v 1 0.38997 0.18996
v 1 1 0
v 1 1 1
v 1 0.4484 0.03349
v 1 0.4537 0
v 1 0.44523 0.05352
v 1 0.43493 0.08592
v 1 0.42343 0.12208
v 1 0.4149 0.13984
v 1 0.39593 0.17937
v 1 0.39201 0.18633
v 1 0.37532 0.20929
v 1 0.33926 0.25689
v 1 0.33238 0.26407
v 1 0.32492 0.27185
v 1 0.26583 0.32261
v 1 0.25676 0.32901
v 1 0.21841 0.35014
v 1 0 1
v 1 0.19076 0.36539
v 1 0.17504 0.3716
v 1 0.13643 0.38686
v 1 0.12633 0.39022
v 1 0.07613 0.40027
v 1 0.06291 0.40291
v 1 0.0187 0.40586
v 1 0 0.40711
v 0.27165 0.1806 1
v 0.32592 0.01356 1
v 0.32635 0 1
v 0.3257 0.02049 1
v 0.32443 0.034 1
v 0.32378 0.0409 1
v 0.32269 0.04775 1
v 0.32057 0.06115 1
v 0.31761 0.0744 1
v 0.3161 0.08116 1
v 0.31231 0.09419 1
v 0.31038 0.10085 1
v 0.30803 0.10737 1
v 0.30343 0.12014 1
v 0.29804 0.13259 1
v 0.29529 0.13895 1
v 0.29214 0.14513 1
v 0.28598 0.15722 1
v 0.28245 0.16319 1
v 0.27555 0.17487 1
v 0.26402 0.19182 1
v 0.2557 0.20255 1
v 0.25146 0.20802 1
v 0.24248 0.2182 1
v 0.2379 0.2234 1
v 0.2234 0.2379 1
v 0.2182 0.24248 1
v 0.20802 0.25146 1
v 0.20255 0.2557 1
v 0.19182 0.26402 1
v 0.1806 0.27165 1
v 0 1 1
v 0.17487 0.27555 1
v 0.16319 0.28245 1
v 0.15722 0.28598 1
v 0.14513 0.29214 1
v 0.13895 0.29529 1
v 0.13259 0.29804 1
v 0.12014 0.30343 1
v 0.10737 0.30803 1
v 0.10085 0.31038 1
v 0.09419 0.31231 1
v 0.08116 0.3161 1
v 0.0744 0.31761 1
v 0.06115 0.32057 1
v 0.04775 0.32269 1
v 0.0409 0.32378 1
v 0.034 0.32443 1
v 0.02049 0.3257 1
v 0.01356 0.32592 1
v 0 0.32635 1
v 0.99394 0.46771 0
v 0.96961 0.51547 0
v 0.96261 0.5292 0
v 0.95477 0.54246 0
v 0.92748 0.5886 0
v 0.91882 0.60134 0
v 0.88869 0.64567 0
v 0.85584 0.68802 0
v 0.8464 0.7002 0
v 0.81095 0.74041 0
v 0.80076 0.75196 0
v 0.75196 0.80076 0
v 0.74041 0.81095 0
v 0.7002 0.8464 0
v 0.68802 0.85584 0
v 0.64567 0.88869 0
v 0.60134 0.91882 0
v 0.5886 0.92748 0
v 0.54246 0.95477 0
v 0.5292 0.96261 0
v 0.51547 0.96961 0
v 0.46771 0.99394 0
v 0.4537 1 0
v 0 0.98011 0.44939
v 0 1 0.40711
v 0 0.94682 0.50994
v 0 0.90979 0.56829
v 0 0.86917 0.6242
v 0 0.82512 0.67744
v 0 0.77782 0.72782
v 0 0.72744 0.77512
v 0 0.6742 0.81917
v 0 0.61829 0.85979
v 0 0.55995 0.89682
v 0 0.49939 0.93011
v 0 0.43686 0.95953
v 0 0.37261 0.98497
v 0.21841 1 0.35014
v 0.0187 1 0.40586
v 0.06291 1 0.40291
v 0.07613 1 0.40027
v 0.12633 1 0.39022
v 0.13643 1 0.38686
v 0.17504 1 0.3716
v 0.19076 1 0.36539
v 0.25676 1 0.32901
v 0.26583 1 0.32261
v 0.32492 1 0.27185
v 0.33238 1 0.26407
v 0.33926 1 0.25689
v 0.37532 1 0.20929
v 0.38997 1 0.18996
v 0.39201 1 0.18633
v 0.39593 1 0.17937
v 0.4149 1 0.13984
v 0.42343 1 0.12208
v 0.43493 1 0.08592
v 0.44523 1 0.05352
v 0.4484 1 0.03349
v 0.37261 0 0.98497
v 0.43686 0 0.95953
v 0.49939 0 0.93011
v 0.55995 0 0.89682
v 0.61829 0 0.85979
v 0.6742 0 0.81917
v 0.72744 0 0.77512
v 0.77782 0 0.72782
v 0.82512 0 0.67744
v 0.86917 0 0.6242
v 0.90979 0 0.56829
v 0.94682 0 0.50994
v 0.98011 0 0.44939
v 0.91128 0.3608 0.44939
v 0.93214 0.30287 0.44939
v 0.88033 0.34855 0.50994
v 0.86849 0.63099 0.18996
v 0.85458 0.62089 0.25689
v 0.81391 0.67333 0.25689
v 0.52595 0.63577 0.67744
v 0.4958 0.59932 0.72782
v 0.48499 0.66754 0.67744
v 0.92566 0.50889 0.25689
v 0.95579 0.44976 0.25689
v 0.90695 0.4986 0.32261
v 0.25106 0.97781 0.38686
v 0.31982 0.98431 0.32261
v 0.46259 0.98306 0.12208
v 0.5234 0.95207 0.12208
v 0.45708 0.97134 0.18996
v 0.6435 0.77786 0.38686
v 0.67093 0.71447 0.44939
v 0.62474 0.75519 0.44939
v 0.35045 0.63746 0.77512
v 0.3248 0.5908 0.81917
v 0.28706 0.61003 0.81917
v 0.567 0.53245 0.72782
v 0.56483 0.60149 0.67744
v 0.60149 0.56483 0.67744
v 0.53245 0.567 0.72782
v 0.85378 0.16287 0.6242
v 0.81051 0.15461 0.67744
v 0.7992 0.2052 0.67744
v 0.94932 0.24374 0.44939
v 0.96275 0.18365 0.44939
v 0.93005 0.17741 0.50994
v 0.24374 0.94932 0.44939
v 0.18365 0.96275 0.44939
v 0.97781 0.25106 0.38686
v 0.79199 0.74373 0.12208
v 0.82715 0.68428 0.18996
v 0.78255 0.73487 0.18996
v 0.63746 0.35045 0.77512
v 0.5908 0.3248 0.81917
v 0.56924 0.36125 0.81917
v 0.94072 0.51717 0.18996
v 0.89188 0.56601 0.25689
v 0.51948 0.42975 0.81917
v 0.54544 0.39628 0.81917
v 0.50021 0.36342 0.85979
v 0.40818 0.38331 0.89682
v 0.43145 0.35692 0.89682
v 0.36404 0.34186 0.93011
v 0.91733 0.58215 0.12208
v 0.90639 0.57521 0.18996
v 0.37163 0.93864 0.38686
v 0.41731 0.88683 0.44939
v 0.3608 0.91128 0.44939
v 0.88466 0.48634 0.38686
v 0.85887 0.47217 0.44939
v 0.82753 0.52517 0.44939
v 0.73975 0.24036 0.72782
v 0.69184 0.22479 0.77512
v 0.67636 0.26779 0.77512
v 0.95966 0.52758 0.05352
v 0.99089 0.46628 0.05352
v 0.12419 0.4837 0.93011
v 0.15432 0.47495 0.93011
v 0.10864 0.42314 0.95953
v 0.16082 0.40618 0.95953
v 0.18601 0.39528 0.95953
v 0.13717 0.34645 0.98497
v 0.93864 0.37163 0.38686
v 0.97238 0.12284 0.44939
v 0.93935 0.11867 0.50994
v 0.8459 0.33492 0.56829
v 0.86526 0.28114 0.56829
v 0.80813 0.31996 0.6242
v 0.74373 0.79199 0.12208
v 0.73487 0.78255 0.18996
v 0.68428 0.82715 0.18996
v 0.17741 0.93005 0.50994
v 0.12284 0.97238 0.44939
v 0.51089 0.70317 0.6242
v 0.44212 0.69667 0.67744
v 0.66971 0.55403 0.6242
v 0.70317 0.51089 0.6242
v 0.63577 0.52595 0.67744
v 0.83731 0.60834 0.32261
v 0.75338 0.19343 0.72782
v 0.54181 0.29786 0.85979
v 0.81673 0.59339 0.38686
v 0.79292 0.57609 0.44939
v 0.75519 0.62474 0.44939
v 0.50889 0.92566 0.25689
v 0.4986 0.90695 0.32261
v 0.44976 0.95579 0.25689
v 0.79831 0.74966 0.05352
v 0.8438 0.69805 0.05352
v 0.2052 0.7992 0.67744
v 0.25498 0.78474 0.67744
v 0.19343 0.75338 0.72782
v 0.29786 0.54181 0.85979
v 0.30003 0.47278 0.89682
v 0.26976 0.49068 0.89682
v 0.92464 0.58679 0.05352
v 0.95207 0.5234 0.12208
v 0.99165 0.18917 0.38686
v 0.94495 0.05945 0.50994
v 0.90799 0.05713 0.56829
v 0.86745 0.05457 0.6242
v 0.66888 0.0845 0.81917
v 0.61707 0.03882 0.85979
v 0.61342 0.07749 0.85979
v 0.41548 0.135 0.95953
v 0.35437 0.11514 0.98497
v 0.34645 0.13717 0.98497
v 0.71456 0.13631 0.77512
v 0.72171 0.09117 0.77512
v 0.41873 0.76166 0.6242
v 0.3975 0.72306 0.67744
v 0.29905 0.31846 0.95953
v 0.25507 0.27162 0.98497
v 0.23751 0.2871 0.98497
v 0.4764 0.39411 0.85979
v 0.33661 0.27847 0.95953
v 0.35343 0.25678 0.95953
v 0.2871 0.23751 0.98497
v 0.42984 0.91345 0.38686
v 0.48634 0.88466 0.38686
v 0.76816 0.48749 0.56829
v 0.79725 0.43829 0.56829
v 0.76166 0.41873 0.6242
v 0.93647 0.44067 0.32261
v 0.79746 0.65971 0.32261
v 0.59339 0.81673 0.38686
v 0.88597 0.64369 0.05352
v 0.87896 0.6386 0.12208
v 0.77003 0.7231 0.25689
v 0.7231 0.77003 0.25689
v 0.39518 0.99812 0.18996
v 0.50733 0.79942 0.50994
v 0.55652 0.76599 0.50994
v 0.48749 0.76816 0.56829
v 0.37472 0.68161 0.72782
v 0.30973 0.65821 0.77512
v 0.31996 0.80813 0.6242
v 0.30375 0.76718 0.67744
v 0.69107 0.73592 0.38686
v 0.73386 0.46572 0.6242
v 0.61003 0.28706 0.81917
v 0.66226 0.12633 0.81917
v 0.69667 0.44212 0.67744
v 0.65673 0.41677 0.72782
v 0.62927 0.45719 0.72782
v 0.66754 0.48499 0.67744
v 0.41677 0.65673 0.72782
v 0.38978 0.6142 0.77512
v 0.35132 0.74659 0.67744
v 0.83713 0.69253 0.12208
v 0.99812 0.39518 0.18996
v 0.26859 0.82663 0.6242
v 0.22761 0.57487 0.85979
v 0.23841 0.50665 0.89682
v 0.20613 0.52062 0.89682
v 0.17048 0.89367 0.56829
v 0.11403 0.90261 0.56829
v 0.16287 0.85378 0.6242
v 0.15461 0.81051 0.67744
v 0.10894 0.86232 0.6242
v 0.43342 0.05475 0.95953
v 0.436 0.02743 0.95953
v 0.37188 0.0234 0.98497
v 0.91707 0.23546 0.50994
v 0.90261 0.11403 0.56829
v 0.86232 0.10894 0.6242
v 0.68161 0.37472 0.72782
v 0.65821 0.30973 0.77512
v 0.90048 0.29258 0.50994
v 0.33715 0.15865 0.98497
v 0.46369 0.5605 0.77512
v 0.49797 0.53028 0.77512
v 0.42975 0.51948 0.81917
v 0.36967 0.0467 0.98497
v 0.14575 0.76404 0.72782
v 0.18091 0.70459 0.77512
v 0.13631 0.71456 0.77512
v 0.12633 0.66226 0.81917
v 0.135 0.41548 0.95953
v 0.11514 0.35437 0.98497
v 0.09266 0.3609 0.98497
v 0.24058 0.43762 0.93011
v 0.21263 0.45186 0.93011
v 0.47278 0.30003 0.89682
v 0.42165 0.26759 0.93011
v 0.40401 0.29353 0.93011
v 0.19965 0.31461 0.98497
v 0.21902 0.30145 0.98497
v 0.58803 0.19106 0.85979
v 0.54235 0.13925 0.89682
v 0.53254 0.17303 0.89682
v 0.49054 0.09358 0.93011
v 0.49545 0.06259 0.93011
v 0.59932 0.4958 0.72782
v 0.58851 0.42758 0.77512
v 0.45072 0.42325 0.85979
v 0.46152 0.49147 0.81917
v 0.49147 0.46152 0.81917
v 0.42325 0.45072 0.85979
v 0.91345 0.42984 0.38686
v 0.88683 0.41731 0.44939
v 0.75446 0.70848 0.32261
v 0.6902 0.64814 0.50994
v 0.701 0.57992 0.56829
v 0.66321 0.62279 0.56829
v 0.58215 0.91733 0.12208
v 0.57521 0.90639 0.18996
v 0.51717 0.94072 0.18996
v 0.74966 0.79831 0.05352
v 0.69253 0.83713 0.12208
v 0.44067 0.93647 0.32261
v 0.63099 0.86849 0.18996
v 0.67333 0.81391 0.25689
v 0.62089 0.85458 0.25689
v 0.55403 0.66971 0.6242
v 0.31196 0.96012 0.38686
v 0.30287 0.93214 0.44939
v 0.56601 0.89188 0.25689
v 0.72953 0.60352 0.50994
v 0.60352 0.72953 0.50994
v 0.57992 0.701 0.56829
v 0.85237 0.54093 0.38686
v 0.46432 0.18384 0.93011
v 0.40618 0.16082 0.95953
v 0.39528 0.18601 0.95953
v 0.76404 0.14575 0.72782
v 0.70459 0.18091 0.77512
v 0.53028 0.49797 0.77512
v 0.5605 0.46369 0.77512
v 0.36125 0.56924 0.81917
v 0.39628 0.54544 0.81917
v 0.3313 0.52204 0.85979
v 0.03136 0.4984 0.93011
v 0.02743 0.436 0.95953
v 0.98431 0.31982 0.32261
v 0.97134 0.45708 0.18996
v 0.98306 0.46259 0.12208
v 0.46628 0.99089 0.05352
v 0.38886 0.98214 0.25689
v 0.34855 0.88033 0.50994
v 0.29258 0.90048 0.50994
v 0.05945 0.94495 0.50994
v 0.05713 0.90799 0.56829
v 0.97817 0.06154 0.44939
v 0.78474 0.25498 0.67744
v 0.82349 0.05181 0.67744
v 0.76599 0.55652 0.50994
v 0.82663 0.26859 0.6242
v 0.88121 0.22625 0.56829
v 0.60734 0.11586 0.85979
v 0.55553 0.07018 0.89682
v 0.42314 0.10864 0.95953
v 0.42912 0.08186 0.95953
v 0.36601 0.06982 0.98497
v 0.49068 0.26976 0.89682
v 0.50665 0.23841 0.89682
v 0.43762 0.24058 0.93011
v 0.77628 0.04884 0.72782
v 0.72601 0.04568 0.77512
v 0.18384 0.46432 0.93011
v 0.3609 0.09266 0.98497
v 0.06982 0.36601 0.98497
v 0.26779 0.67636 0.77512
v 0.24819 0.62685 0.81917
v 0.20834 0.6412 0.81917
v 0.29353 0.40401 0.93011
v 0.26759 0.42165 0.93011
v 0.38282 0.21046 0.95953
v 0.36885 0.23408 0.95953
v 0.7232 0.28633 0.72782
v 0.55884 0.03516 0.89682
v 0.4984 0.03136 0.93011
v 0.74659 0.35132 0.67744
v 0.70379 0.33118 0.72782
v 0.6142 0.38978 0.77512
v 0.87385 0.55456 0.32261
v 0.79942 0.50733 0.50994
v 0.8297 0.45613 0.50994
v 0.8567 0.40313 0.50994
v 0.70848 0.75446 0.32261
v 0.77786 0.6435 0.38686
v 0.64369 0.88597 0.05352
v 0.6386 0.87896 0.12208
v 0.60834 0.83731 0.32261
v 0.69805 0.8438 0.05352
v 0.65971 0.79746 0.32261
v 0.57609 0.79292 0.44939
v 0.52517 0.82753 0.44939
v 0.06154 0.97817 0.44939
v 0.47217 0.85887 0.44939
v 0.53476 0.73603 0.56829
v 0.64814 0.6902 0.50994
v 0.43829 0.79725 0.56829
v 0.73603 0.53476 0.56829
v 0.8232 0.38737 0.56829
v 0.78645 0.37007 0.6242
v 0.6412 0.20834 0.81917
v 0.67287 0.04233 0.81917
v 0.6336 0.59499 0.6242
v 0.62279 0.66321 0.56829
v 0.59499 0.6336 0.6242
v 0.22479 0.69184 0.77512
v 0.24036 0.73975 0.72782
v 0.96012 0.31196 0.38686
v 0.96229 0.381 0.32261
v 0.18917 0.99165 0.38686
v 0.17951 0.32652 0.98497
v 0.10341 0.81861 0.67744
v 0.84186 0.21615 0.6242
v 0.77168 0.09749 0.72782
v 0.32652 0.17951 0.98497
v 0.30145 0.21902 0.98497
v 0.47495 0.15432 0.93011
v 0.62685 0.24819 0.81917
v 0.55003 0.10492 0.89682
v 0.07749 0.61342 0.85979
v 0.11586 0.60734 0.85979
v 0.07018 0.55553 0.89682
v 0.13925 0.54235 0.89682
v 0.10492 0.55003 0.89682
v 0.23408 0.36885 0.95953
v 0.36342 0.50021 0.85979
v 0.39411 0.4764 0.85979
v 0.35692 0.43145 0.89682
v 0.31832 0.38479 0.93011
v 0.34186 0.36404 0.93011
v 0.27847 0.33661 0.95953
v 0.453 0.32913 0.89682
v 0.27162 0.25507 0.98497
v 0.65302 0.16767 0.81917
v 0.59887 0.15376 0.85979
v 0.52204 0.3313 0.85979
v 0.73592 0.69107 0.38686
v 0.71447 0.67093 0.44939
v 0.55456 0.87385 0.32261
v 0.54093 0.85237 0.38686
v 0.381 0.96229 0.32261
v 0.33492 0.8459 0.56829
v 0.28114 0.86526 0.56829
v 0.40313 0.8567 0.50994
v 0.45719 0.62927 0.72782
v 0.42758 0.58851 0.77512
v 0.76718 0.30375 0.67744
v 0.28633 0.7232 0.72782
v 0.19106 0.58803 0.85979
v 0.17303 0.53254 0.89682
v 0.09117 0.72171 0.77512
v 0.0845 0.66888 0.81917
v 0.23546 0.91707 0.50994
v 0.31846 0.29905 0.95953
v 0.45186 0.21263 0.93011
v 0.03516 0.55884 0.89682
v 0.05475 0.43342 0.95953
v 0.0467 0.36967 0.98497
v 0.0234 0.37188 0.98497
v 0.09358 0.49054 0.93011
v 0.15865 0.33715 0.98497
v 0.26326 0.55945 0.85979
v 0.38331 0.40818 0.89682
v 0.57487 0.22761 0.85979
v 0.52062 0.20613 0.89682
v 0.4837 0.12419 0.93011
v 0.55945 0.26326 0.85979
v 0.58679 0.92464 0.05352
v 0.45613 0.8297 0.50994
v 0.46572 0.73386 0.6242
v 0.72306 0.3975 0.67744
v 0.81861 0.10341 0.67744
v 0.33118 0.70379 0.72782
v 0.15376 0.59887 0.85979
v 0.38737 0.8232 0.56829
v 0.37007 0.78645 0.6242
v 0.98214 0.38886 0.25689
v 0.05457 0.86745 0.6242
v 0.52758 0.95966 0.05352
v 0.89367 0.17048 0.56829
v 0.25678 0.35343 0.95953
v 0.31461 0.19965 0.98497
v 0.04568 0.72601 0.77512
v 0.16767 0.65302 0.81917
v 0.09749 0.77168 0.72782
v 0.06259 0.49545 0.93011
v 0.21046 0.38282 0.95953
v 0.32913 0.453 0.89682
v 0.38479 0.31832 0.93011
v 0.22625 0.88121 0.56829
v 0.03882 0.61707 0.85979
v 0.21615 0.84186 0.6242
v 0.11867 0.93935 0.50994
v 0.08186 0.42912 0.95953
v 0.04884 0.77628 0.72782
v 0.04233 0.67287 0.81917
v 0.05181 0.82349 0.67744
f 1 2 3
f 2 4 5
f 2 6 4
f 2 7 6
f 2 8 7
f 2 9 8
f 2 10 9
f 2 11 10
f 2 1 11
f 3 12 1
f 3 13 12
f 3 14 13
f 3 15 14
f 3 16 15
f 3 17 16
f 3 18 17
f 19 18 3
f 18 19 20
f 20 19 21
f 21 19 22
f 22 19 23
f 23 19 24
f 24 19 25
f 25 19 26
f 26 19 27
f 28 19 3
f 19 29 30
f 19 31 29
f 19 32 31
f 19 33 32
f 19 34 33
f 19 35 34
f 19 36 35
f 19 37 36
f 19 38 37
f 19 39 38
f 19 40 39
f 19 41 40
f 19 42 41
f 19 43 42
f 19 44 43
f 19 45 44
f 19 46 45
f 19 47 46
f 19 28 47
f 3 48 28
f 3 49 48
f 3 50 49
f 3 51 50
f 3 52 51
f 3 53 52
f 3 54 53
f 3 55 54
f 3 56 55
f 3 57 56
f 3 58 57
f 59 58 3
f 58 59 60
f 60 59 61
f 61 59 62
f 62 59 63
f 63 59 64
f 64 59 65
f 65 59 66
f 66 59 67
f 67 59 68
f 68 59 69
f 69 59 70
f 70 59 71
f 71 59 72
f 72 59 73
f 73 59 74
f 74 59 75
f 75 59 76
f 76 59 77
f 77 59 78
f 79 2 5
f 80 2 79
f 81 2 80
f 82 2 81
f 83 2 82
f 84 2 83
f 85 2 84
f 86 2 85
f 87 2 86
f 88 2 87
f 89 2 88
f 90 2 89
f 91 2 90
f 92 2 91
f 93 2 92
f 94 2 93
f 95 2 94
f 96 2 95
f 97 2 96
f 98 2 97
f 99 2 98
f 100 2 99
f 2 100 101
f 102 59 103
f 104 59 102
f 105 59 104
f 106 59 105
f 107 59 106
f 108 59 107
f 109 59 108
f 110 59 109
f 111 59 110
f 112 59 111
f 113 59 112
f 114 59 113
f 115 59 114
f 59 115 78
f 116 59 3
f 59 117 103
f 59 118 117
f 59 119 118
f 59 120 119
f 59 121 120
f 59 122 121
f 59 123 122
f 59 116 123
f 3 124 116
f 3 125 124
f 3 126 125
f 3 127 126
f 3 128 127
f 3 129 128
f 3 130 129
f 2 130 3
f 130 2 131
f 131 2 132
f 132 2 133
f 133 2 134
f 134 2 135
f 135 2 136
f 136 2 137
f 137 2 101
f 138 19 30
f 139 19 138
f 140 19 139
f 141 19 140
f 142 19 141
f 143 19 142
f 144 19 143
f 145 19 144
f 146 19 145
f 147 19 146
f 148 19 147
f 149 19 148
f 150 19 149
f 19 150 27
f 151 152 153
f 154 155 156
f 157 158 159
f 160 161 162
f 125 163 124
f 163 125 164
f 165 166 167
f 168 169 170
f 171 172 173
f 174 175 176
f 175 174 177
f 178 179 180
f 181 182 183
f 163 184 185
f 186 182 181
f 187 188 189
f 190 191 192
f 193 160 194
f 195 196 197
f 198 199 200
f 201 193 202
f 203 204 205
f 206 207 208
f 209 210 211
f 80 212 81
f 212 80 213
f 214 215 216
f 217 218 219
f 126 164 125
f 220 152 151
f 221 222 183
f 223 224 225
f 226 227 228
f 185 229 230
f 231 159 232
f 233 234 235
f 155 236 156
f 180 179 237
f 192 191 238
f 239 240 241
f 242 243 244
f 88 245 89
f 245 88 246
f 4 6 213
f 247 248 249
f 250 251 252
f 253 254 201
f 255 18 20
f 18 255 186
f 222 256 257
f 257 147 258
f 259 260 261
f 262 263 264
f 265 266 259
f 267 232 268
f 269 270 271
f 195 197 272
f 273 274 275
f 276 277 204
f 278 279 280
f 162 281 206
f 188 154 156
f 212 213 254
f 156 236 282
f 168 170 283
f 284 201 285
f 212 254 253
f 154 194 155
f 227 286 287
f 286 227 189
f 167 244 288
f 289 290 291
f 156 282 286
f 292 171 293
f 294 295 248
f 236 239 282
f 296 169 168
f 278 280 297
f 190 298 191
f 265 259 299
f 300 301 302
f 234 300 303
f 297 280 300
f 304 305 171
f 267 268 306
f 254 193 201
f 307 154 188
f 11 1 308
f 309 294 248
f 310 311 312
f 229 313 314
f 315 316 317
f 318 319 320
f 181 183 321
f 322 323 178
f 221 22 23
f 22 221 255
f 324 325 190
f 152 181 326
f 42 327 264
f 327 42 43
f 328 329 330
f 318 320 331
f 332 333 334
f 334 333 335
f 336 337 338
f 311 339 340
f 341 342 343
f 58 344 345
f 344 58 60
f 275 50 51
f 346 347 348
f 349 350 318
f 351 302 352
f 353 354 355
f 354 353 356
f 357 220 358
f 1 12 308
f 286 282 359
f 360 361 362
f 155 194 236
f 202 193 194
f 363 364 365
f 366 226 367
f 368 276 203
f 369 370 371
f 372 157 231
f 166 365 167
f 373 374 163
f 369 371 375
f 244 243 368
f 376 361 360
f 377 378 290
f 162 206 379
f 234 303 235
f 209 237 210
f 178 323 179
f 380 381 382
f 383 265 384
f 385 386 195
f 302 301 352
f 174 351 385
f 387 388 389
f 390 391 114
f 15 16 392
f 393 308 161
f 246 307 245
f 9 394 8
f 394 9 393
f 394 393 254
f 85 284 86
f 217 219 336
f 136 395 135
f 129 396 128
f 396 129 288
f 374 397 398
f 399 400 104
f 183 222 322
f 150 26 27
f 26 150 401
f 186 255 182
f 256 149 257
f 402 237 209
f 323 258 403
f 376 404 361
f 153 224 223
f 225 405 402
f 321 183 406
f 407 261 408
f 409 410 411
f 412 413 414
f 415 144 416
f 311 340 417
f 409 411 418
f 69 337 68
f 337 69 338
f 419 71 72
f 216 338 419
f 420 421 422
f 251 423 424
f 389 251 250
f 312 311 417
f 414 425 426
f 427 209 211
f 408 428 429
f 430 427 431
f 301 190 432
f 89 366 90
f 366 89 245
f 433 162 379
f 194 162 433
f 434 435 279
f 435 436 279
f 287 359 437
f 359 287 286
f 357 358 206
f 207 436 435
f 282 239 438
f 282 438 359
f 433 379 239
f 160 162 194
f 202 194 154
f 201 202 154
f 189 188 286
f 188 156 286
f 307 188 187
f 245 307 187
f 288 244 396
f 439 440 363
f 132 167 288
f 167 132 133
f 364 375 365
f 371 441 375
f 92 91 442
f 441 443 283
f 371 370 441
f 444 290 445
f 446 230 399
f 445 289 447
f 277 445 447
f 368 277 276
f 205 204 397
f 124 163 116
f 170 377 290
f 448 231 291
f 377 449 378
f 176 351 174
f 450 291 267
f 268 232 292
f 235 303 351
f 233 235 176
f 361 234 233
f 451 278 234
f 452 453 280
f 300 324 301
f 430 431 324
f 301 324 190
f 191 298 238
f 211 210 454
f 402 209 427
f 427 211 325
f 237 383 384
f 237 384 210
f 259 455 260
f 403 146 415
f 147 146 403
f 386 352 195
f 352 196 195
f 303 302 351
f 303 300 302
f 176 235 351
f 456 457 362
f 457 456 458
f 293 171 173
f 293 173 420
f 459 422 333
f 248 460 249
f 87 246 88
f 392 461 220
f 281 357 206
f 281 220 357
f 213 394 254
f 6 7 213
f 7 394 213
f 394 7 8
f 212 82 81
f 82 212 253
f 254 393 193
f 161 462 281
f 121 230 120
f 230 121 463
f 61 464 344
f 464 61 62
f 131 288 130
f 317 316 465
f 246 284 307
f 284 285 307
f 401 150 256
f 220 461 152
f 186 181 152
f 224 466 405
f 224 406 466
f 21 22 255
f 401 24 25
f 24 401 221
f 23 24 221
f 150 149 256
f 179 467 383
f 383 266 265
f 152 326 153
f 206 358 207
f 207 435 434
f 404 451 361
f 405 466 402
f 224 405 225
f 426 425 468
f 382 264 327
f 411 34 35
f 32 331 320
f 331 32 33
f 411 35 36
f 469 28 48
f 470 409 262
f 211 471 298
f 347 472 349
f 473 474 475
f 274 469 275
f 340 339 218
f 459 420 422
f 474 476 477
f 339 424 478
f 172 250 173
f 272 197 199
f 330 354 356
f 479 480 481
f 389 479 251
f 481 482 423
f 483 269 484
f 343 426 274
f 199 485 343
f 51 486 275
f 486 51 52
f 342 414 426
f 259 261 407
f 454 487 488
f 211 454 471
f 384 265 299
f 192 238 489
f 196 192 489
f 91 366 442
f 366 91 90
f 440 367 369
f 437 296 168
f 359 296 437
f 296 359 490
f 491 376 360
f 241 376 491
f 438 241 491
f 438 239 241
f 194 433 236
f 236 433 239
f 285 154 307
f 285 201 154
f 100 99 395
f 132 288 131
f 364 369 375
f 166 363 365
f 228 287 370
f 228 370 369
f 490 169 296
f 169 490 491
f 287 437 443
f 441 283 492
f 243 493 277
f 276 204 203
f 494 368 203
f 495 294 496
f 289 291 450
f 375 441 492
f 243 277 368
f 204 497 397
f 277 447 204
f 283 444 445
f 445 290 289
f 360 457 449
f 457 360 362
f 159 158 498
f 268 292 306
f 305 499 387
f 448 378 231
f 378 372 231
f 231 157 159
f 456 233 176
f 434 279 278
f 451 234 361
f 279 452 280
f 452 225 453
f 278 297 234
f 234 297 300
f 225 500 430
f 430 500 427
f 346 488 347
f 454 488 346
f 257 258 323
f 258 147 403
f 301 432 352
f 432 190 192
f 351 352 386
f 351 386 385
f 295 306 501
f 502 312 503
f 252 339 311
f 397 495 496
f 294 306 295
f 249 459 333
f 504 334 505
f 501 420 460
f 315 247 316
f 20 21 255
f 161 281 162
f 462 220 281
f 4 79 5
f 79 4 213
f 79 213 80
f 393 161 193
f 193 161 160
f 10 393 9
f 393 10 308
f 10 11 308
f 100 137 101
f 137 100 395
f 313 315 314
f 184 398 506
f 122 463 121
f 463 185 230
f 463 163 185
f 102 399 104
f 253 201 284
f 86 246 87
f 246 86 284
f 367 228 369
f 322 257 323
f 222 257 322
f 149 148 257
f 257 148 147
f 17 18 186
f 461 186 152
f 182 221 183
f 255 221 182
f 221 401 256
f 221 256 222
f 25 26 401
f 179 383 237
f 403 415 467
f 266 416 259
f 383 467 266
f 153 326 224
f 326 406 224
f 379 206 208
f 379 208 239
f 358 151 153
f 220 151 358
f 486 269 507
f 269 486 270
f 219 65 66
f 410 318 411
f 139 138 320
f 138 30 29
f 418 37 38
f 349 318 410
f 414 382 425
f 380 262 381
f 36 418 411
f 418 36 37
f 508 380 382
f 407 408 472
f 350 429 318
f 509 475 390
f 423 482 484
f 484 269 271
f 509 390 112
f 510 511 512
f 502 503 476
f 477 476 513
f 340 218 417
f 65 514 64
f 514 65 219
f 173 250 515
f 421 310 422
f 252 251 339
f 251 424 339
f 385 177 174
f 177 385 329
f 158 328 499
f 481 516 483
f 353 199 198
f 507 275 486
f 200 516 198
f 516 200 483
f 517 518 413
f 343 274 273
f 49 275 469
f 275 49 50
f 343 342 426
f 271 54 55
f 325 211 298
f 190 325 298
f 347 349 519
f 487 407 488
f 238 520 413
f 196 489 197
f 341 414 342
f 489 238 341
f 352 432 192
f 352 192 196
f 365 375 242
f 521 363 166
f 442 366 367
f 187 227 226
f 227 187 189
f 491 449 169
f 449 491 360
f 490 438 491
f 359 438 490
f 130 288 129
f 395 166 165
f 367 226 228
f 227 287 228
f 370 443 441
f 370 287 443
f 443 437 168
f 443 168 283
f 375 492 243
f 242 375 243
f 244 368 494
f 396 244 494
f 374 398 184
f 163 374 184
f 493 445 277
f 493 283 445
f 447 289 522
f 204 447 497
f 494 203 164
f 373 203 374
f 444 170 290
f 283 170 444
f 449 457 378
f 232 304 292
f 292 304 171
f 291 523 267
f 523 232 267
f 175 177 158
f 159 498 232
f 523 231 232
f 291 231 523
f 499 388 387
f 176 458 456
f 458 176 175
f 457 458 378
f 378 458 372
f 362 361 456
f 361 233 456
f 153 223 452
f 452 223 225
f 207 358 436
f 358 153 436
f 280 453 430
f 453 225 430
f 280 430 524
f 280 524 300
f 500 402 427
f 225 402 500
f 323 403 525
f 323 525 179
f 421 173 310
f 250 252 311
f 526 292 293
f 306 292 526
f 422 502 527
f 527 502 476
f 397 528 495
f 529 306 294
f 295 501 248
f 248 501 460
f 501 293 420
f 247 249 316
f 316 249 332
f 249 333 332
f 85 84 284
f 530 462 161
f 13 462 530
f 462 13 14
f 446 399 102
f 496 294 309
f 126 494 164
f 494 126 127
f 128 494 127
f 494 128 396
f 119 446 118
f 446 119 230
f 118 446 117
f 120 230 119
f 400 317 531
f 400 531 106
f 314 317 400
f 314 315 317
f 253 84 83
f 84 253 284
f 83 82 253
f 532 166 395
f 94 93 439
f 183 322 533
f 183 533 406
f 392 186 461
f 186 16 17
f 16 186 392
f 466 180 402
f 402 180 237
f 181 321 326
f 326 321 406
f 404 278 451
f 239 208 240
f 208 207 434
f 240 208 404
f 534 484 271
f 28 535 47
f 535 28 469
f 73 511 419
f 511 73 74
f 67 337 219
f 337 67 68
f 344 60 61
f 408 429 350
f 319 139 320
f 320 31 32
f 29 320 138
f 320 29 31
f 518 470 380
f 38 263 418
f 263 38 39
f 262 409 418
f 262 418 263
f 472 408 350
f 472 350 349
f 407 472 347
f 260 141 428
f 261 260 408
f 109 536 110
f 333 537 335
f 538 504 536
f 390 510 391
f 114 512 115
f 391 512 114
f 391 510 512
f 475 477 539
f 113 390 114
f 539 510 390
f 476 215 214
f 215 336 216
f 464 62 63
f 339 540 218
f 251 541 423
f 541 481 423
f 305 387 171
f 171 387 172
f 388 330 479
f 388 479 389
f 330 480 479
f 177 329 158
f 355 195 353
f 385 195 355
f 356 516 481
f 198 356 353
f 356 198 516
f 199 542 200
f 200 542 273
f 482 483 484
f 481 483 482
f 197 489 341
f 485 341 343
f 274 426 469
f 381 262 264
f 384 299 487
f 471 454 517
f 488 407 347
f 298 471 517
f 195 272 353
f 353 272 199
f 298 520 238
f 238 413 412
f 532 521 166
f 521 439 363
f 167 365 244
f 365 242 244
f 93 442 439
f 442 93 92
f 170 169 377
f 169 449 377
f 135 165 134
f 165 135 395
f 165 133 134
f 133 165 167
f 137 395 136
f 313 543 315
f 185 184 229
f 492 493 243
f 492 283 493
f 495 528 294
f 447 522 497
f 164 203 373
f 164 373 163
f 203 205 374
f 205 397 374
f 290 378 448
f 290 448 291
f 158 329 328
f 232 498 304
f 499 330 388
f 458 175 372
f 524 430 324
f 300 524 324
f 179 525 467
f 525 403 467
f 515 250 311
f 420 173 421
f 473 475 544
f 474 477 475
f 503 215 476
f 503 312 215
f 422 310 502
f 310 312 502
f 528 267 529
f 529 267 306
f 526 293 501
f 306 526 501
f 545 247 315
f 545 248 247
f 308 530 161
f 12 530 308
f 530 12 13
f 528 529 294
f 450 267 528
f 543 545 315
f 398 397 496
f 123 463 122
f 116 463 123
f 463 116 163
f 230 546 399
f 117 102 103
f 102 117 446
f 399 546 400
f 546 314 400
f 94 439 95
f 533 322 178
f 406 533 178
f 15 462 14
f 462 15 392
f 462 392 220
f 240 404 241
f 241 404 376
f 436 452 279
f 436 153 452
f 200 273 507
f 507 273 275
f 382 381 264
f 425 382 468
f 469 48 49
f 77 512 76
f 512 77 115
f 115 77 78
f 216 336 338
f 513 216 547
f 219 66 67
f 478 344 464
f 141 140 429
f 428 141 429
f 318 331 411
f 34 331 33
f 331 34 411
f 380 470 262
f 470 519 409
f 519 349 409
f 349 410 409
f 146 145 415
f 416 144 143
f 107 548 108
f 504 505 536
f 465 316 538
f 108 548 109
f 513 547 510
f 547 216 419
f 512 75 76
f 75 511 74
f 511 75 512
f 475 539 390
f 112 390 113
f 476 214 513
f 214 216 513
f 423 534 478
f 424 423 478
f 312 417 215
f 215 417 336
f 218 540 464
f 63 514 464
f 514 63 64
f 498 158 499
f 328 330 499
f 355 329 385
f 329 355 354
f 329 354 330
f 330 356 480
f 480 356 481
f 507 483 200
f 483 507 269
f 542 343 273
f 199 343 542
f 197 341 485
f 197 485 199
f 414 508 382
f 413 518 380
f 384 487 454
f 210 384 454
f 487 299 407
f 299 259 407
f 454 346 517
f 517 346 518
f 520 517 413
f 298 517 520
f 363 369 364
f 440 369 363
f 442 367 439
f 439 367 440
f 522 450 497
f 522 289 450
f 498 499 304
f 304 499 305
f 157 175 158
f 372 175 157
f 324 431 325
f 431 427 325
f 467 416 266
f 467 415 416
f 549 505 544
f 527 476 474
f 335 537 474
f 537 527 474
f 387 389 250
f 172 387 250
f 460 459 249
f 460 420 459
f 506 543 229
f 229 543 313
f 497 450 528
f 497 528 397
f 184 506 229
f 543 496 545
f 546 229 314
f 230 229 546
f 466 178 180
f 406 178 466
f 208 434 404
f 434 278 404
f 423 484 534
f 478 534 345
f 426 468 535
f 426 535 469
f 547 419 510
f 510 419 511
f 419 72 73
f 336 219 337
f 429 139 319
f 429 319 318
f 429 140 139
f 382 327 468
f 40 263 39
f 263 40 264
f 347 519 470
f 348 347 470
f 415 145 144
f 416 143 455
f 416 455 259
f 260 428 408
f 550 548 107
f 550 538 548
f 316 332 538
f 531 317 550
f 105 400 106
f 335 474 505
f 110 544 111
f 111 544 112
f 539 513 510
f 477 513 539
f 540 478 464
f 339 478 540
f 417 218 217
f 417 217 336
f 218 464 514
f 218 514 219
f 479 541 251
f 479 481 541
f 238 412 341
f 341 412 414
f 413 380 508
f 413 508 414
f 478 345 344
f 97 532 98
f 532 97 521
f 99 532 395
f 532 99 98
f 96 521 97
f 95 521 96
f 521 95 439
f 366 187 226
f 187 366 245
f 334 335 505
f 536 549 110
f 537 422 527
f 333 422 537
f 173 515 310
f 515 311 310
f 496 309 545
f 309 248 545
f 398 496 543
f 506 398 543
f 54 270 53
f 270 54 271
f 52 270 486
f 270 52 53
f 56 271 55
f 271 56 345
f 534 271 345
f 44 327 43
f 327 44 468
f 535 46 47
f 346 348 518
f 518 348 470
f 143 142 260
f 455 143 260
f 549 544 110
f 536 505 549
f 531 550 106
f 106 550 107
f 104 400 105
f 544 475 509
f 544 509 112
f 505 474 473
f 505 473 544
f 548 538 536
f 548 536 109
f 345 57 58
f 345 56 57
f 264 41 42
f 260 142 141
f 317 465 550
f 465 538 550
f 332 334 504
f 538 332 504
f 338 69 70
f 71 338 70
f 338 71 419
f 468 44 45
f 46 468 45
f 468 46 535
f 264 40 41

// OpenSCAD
$fn=100;
difference(){
cube(1);
translate([0.0,0,-0.05]){sphere(1.1); }  
}
